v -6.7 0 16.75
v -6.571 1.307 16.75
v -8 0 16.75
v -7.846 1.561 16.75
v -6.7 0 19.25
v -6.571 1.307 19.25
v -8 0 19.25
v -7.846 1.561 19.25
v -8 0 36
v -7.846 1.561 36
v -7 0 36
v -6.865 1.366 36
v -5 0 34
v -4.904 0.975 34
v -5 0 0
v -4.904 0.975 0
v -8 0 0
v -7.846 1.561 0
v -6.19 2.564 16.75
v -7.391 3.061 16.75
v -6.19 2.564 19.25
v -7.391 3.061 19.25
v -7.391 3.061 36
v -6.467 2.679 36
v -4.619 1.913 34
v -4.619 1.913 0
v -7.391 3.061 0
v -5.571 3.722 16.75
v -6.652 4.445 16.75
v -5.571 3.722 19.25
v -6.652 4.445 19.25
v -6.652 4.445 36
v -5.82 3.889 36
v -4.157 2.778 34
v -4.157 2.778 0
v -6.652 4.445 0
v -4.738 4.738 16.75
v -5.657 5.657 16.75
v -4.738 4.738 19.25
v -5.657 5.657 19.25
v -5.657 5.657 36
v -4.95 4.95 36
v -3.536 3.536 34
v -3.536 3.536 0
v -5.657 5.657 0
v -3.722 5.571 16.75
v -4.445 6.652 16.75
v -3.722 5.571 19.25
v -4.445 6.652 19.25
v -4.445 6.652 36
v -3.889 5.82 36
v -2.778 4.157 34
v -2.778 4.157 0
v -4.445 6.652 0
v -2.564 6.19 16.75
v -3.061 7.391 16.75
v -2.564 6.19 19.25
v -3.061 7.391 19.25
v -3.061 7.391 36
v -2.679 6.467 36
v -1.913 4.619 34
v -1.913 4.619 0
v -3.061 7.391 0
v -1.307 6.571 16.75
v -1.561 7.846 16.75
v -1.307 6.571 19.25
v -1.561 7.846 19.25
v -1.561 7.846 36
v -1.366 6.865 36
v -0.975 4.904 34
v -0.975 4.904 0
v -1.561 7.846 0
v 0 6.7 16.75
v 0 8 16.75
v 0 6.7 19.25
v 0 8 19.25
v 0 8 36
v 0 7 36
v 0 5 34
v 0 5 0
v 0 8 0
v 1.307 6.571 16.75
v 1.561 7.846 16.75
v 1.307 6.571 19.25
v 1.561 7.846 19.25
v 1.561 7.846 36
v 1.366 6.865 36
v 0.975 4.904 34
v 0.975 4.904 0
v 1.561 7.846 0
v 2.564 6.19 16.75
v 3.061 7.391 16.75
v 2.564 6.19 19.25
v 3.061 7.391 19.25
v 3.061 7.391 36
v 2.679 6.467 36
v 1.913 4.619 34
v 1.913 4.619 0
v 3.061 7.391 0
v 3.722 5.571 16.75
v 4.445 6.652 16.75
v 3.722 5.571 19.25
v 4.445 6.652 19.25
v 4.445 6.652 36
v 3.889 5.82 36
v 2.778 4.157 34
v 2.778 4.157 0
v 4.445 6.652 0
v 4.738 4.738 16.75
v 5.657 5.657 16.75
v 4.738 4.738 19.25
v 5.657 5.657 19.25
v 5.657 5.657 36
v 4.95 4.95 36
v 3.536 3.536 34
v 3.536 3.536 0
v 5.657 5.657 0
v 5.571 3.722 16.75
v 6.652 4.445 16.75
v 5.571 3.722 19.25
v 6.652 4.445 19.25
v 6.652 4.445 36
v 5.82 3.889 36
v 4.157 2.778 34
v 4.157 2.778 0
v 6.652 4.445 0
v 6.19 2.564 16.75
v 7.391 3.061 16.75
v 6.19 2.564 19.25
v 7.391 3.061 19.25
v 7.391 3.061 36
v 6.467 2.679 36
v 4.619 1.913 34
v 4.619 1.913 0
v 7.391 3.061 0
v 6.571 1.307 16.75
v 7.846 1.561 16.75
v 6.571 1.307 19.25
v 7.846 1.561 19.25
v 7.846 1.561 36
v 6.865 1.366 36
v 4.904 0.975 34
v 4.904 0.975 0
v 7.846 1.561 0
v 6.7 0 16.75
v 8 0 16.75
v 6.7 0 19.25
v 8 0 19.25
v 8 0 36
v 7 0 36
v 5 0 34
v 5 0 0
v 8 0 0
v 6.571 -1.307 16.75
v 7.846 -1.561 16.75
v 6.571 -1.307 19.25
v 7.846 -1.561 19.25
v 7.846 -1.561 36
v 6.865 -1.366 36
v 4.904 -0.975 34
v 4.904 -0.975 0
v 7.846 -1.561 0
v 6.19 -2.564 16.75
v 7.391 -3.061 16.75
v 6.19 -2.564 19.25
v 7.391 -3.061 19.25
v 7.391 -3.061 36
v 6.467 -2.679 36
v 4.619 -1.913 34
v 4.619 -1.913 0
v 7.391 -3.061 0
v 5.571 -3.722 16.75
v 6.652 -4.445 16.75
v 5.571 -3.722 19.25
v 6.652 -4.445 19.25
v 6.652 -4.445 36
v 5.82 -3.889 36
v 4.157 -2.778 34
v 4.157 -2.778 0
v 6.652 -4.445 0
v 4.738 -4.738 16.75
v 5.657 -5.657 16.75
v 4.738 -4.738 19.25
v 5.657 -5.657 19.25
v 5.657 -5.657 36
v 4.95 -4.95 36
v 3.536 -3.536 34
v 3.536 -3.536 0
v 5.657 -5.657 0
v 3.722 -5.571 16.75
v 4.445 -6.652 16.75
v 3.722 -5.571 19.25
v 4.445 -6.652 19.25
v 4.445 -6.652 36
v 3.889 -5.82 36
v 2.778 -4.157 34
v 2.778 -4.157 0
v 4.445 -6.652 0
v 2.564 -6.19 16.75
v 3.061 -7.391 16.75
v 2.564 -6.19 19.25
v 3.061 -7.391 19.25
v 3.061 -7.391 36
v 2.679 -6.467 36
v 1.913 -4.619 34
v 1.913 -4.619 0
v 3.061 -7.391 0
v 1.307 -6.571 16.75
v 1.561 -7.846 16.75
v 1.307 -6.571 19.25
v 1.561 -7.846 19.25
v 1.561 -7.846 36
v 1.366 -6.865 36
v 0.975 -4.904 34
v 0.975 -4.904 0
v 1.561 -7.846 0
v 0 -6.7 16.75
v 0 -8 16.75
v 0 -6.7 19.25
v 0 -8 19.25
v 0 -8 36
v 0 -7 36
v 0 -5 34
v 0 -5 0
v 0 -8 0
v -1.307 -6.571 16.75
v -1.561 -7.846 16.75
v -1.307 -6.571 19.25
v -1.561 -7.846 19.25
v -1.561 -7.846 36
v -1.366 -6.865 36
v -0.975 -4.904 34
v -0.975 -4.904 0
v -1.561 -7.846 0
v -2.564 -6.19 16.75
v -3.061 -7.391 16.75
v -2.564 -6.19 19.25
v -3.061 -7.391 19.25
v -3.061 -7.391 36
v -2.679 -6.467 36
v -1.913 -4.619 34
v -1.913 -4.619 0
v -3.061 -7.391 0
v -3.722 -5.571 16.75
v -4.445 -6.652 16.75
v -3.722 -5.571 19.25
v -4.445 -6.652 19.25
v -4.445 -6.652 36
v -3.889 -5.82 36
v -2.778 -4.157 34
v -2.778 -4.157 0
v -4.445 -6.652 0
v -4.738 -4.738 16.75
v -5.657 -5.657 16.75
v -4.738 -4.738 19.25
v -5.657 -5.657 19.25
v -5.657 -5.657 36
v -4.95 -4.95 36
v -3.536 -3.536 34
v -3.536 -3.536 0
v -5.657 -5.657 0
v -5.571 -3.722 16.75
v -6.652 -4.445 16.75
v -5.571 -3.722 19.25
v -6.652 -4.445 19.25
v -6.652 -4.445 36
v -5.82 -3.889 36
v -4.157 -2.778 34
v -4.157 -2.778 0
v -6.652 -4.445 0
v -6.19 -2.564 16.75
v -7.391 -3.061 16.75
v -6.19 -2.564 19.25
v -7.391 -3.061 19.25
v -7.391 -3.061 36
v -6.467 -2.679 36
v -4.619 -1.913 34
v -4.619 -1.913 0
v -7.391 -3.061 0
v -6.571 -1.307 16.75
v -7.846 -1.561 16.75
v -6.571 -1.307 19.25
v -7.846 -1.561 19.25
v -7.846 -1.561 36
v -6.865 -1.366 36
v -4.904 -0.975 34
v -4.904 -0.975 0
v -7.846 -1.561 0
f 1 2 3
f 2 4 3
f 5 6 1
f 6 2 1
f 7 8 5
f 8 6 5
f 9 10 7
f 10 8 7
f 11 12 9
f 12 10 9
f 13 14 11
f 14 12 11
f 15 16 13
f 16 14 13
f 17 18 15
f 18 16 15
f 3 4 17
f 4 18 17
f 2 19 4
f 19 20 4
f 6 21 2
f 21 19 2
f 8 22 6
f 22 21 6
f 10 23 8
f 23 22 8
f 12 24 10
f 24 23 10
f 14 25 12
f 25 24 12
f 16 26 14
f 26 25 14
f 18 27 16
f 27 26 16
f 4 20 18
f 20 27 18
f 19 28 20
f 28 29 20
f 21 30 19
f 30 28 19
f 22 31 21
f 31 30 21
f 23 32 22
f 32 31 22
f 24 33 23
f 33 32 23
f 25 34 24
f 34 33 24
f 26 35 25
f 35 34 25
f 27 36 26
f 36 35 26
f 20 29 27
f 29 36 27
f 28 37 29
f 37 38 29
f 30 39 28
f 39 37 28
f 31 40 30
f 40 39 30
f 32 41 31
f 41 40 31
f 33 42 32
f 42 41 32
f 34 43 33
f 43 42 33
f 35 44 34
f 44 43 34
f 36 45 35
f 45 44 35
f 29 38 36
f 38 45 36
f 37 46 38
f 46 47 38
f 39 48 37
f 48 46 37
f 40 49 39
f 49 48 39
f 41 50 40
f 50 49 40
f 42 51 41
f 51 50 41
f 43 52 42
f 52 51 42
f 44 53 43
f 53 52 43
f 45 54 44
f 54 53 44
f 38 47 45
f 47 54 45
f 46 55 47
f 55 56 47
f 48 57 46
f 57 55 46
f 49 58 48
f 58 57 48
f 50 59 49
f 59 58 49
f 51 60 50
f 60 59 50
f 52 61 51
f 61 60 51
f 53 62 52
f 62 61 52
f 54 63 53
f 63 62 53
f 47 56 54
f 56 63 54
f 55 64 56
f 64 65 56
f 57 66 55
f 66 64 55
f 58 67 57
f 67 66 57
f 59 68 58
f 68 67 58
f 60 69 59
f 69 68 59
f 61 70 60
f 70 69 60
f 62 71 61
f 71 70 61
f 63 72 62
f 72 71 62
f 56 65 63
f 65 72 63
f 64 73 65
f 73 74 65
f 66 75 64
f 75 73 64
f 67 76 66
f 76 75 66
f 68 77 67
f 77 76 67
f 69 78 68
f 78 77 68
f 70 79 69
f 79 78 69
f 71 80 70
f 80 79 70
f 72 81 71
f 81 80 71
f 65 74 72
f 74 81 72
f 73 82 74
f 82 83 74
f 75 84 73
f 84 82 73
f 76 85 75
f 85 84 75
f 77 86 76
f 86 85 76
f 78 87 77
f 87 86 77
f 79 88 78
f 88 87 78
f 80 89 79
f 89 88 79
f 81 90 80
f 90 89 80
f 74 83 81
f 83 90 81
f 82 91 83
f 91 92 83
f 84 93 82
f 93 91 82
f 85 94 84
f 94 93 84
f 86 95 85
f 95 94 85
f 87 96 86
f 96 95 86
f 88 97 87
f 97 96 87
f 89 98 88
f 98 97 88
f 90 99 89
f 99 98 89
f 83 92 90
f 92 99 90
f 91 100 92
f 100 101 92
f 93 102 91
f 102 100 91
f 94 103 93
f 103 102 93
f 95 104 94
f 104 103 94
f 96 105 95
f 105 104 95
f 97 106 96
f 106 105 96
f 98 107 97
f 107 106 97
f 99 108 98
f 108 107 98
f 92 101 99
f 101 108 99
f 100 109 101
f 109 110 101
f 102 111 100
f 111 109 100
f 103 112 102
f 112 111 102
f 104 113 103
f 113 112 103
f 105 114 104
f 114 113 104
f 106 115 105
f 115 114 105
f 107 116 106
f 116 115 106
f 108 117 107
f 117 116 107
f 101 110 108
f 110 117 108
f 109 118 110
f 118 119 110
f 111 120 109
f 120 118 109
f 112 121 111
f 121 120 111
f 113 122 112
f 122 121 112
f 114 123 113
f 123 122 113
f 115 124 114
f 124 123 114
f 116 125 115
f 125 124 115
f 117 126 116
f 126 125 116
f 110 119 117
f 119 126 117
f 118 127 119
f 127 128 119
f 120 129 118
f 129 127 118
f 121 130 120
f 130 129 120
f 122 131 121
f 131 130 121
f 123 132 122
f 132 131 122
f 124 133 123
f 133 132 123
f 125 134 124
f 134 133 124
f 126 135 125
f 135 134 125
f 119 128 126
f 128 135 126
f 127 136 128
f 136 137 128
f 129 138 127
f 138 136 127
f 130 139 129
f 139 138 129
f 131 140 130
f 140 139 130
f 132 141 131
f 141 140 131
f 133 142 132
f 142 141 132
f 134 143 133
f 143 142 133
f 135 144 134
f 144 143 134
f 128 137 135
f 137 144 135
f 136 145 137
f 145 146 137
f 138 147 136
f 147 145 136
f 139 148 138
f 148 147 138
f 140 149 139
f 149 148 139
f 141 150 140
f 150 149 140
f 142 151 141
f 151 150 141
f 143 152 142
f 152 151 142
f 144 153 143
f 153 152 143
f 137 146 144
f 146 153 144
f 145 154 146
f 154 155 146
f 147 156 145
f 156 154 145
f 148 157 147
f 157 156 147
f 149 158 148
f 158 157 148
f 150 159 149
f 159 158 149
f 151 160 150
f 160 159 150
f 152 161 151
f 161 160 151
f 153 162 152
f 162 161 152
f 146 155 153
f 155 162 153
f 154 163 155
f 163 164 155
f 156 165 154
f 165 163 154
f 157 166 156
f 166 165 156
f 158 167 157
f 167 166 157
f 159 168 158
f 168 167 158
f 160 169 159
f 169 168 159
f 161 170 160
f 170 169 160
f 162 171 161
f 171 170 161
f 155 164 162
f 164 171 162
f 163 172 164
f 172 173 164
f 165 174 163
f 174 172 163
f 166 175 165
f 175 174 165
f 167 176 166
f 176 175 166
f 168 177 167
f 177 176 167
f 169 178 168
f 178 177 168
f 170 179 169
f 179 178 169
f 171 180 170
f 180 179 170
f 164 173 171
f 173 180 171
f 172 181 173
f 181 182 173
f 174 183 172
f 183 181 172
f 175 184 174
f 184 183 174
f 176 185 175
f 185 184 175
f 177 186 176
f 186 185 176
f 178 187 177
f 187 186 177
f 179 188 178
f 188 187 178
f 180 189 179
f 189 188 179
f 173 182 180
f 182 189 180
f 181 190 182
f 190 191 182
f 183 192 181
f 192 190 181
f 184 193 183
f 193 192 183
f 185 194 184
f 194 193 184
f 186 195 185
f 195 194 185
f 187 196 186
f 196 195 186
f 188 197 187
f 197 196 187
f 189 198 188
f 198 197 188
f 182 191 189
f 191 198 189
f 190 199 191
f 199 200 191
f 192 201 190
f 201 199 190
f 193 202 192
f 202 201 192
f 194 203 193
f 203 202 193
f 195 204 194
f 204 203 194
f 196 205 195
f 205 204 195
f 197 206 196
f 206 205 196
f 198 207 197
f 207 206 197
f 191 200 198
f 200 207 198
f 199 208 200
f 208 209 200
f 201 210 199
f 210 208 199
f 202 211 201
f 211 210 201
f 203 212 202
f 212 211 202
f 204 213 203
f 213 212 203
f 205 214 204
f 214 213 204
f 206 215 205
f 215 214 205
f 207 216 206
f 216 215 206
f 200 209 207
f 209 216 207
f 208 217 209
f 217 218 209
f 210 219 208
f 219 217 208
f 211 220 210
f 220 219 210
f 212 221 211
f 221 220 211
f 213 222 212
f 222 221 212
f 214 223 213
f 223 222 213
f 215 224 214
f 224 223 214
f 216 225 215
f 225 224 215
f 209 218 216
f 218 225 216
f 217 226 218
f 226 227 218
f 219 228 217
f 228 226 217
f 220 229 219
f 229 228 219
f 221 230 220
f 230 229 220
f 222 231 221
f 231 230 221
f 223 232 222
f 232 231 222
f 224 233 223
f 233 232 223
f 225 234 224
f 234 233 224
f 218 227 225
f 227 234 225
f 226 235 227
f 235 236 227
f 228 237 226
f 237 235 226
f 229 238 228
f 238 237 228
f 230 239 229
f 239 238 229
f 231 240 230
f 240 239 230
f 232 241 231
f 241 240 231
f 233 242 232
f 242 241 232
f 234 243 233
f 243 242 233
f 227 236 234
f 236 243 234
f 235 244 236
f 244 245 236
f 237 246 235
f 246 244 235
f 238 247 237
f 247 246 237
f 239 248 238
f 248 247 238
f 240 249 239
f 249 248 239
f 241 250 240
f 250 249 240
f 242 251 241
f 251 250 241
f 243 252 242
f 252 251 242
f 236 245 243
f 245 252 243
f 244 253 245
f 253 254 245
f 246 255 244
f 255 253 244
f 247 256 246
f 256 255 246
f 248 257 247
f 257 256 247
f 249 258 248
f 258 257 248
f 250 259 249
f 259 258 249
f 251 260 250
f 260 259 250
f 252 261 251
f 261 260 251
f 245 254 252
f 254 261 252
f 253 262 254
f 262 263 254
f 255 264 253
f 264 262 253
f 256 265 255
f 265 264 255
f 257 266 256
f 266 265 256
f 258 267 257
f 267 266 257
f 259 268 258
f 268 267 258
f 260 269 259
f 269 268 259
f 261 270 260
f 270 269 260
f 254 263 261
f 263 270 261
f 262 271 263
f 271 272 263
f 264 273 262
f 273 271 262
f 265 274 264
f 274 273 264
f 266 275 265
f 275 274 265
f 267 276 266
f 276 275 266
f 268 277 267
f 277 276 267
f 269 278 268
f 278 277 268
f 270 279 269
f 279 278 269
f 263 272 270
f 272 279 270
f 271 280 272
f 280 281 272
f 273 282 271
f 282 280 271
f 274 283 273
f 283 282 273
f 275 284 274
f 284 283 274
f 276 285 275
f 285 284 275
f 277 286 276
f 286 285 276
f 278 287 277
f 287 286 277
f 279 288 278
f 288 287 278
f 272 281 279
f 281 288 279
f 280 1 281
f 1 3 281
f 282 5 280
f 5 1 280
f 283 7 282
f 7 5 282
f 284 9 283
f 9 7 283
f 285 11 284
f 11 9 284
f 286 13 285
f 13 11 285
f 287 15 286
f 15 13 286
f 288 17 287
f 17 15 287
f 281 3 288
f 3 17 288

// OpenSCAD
$fn = 32;

// ----------------------------------------------------------------------
// Grooved revolve: thread_relief, bore R5
// ----------------------------------------------------------------------

// --- parameters (mm) ---
bore_r = 5;               // bore radius
outer_r = 8;              // outer radius of the body
total_h = 36;             // overall height, Z
wall = 3;                 // radial wall thickness
groove_w = 2.5;           // groove width
groove_d = 1.3;           // groove depth
grooves = 1;              // number of outer grooves
relief = 2;               // thread relief leg at the bore mouth
relief_angle = 45;        // thread relief chamfer angle, degrees

bbox_x = 2 * outer_r;  // full diameter
bore_d = 2 * bore_r;  // bore diameter
body_d = 2 * outer_r;  // body diameter
revolve_angle = 360;  // full turn around the Z axis

profile = [[5, 0], [8, 0], [8, 16.75], [6.7, 16.75], [6.7, 19.25], [8, 19.25], [8, 36], [7, 36], [5, 34]];  // primary outline, 9 points, counter clockwise

// --- the one profile operation ---
rotate_extrude(angle = revolve_angle) polygon(points = profile);
